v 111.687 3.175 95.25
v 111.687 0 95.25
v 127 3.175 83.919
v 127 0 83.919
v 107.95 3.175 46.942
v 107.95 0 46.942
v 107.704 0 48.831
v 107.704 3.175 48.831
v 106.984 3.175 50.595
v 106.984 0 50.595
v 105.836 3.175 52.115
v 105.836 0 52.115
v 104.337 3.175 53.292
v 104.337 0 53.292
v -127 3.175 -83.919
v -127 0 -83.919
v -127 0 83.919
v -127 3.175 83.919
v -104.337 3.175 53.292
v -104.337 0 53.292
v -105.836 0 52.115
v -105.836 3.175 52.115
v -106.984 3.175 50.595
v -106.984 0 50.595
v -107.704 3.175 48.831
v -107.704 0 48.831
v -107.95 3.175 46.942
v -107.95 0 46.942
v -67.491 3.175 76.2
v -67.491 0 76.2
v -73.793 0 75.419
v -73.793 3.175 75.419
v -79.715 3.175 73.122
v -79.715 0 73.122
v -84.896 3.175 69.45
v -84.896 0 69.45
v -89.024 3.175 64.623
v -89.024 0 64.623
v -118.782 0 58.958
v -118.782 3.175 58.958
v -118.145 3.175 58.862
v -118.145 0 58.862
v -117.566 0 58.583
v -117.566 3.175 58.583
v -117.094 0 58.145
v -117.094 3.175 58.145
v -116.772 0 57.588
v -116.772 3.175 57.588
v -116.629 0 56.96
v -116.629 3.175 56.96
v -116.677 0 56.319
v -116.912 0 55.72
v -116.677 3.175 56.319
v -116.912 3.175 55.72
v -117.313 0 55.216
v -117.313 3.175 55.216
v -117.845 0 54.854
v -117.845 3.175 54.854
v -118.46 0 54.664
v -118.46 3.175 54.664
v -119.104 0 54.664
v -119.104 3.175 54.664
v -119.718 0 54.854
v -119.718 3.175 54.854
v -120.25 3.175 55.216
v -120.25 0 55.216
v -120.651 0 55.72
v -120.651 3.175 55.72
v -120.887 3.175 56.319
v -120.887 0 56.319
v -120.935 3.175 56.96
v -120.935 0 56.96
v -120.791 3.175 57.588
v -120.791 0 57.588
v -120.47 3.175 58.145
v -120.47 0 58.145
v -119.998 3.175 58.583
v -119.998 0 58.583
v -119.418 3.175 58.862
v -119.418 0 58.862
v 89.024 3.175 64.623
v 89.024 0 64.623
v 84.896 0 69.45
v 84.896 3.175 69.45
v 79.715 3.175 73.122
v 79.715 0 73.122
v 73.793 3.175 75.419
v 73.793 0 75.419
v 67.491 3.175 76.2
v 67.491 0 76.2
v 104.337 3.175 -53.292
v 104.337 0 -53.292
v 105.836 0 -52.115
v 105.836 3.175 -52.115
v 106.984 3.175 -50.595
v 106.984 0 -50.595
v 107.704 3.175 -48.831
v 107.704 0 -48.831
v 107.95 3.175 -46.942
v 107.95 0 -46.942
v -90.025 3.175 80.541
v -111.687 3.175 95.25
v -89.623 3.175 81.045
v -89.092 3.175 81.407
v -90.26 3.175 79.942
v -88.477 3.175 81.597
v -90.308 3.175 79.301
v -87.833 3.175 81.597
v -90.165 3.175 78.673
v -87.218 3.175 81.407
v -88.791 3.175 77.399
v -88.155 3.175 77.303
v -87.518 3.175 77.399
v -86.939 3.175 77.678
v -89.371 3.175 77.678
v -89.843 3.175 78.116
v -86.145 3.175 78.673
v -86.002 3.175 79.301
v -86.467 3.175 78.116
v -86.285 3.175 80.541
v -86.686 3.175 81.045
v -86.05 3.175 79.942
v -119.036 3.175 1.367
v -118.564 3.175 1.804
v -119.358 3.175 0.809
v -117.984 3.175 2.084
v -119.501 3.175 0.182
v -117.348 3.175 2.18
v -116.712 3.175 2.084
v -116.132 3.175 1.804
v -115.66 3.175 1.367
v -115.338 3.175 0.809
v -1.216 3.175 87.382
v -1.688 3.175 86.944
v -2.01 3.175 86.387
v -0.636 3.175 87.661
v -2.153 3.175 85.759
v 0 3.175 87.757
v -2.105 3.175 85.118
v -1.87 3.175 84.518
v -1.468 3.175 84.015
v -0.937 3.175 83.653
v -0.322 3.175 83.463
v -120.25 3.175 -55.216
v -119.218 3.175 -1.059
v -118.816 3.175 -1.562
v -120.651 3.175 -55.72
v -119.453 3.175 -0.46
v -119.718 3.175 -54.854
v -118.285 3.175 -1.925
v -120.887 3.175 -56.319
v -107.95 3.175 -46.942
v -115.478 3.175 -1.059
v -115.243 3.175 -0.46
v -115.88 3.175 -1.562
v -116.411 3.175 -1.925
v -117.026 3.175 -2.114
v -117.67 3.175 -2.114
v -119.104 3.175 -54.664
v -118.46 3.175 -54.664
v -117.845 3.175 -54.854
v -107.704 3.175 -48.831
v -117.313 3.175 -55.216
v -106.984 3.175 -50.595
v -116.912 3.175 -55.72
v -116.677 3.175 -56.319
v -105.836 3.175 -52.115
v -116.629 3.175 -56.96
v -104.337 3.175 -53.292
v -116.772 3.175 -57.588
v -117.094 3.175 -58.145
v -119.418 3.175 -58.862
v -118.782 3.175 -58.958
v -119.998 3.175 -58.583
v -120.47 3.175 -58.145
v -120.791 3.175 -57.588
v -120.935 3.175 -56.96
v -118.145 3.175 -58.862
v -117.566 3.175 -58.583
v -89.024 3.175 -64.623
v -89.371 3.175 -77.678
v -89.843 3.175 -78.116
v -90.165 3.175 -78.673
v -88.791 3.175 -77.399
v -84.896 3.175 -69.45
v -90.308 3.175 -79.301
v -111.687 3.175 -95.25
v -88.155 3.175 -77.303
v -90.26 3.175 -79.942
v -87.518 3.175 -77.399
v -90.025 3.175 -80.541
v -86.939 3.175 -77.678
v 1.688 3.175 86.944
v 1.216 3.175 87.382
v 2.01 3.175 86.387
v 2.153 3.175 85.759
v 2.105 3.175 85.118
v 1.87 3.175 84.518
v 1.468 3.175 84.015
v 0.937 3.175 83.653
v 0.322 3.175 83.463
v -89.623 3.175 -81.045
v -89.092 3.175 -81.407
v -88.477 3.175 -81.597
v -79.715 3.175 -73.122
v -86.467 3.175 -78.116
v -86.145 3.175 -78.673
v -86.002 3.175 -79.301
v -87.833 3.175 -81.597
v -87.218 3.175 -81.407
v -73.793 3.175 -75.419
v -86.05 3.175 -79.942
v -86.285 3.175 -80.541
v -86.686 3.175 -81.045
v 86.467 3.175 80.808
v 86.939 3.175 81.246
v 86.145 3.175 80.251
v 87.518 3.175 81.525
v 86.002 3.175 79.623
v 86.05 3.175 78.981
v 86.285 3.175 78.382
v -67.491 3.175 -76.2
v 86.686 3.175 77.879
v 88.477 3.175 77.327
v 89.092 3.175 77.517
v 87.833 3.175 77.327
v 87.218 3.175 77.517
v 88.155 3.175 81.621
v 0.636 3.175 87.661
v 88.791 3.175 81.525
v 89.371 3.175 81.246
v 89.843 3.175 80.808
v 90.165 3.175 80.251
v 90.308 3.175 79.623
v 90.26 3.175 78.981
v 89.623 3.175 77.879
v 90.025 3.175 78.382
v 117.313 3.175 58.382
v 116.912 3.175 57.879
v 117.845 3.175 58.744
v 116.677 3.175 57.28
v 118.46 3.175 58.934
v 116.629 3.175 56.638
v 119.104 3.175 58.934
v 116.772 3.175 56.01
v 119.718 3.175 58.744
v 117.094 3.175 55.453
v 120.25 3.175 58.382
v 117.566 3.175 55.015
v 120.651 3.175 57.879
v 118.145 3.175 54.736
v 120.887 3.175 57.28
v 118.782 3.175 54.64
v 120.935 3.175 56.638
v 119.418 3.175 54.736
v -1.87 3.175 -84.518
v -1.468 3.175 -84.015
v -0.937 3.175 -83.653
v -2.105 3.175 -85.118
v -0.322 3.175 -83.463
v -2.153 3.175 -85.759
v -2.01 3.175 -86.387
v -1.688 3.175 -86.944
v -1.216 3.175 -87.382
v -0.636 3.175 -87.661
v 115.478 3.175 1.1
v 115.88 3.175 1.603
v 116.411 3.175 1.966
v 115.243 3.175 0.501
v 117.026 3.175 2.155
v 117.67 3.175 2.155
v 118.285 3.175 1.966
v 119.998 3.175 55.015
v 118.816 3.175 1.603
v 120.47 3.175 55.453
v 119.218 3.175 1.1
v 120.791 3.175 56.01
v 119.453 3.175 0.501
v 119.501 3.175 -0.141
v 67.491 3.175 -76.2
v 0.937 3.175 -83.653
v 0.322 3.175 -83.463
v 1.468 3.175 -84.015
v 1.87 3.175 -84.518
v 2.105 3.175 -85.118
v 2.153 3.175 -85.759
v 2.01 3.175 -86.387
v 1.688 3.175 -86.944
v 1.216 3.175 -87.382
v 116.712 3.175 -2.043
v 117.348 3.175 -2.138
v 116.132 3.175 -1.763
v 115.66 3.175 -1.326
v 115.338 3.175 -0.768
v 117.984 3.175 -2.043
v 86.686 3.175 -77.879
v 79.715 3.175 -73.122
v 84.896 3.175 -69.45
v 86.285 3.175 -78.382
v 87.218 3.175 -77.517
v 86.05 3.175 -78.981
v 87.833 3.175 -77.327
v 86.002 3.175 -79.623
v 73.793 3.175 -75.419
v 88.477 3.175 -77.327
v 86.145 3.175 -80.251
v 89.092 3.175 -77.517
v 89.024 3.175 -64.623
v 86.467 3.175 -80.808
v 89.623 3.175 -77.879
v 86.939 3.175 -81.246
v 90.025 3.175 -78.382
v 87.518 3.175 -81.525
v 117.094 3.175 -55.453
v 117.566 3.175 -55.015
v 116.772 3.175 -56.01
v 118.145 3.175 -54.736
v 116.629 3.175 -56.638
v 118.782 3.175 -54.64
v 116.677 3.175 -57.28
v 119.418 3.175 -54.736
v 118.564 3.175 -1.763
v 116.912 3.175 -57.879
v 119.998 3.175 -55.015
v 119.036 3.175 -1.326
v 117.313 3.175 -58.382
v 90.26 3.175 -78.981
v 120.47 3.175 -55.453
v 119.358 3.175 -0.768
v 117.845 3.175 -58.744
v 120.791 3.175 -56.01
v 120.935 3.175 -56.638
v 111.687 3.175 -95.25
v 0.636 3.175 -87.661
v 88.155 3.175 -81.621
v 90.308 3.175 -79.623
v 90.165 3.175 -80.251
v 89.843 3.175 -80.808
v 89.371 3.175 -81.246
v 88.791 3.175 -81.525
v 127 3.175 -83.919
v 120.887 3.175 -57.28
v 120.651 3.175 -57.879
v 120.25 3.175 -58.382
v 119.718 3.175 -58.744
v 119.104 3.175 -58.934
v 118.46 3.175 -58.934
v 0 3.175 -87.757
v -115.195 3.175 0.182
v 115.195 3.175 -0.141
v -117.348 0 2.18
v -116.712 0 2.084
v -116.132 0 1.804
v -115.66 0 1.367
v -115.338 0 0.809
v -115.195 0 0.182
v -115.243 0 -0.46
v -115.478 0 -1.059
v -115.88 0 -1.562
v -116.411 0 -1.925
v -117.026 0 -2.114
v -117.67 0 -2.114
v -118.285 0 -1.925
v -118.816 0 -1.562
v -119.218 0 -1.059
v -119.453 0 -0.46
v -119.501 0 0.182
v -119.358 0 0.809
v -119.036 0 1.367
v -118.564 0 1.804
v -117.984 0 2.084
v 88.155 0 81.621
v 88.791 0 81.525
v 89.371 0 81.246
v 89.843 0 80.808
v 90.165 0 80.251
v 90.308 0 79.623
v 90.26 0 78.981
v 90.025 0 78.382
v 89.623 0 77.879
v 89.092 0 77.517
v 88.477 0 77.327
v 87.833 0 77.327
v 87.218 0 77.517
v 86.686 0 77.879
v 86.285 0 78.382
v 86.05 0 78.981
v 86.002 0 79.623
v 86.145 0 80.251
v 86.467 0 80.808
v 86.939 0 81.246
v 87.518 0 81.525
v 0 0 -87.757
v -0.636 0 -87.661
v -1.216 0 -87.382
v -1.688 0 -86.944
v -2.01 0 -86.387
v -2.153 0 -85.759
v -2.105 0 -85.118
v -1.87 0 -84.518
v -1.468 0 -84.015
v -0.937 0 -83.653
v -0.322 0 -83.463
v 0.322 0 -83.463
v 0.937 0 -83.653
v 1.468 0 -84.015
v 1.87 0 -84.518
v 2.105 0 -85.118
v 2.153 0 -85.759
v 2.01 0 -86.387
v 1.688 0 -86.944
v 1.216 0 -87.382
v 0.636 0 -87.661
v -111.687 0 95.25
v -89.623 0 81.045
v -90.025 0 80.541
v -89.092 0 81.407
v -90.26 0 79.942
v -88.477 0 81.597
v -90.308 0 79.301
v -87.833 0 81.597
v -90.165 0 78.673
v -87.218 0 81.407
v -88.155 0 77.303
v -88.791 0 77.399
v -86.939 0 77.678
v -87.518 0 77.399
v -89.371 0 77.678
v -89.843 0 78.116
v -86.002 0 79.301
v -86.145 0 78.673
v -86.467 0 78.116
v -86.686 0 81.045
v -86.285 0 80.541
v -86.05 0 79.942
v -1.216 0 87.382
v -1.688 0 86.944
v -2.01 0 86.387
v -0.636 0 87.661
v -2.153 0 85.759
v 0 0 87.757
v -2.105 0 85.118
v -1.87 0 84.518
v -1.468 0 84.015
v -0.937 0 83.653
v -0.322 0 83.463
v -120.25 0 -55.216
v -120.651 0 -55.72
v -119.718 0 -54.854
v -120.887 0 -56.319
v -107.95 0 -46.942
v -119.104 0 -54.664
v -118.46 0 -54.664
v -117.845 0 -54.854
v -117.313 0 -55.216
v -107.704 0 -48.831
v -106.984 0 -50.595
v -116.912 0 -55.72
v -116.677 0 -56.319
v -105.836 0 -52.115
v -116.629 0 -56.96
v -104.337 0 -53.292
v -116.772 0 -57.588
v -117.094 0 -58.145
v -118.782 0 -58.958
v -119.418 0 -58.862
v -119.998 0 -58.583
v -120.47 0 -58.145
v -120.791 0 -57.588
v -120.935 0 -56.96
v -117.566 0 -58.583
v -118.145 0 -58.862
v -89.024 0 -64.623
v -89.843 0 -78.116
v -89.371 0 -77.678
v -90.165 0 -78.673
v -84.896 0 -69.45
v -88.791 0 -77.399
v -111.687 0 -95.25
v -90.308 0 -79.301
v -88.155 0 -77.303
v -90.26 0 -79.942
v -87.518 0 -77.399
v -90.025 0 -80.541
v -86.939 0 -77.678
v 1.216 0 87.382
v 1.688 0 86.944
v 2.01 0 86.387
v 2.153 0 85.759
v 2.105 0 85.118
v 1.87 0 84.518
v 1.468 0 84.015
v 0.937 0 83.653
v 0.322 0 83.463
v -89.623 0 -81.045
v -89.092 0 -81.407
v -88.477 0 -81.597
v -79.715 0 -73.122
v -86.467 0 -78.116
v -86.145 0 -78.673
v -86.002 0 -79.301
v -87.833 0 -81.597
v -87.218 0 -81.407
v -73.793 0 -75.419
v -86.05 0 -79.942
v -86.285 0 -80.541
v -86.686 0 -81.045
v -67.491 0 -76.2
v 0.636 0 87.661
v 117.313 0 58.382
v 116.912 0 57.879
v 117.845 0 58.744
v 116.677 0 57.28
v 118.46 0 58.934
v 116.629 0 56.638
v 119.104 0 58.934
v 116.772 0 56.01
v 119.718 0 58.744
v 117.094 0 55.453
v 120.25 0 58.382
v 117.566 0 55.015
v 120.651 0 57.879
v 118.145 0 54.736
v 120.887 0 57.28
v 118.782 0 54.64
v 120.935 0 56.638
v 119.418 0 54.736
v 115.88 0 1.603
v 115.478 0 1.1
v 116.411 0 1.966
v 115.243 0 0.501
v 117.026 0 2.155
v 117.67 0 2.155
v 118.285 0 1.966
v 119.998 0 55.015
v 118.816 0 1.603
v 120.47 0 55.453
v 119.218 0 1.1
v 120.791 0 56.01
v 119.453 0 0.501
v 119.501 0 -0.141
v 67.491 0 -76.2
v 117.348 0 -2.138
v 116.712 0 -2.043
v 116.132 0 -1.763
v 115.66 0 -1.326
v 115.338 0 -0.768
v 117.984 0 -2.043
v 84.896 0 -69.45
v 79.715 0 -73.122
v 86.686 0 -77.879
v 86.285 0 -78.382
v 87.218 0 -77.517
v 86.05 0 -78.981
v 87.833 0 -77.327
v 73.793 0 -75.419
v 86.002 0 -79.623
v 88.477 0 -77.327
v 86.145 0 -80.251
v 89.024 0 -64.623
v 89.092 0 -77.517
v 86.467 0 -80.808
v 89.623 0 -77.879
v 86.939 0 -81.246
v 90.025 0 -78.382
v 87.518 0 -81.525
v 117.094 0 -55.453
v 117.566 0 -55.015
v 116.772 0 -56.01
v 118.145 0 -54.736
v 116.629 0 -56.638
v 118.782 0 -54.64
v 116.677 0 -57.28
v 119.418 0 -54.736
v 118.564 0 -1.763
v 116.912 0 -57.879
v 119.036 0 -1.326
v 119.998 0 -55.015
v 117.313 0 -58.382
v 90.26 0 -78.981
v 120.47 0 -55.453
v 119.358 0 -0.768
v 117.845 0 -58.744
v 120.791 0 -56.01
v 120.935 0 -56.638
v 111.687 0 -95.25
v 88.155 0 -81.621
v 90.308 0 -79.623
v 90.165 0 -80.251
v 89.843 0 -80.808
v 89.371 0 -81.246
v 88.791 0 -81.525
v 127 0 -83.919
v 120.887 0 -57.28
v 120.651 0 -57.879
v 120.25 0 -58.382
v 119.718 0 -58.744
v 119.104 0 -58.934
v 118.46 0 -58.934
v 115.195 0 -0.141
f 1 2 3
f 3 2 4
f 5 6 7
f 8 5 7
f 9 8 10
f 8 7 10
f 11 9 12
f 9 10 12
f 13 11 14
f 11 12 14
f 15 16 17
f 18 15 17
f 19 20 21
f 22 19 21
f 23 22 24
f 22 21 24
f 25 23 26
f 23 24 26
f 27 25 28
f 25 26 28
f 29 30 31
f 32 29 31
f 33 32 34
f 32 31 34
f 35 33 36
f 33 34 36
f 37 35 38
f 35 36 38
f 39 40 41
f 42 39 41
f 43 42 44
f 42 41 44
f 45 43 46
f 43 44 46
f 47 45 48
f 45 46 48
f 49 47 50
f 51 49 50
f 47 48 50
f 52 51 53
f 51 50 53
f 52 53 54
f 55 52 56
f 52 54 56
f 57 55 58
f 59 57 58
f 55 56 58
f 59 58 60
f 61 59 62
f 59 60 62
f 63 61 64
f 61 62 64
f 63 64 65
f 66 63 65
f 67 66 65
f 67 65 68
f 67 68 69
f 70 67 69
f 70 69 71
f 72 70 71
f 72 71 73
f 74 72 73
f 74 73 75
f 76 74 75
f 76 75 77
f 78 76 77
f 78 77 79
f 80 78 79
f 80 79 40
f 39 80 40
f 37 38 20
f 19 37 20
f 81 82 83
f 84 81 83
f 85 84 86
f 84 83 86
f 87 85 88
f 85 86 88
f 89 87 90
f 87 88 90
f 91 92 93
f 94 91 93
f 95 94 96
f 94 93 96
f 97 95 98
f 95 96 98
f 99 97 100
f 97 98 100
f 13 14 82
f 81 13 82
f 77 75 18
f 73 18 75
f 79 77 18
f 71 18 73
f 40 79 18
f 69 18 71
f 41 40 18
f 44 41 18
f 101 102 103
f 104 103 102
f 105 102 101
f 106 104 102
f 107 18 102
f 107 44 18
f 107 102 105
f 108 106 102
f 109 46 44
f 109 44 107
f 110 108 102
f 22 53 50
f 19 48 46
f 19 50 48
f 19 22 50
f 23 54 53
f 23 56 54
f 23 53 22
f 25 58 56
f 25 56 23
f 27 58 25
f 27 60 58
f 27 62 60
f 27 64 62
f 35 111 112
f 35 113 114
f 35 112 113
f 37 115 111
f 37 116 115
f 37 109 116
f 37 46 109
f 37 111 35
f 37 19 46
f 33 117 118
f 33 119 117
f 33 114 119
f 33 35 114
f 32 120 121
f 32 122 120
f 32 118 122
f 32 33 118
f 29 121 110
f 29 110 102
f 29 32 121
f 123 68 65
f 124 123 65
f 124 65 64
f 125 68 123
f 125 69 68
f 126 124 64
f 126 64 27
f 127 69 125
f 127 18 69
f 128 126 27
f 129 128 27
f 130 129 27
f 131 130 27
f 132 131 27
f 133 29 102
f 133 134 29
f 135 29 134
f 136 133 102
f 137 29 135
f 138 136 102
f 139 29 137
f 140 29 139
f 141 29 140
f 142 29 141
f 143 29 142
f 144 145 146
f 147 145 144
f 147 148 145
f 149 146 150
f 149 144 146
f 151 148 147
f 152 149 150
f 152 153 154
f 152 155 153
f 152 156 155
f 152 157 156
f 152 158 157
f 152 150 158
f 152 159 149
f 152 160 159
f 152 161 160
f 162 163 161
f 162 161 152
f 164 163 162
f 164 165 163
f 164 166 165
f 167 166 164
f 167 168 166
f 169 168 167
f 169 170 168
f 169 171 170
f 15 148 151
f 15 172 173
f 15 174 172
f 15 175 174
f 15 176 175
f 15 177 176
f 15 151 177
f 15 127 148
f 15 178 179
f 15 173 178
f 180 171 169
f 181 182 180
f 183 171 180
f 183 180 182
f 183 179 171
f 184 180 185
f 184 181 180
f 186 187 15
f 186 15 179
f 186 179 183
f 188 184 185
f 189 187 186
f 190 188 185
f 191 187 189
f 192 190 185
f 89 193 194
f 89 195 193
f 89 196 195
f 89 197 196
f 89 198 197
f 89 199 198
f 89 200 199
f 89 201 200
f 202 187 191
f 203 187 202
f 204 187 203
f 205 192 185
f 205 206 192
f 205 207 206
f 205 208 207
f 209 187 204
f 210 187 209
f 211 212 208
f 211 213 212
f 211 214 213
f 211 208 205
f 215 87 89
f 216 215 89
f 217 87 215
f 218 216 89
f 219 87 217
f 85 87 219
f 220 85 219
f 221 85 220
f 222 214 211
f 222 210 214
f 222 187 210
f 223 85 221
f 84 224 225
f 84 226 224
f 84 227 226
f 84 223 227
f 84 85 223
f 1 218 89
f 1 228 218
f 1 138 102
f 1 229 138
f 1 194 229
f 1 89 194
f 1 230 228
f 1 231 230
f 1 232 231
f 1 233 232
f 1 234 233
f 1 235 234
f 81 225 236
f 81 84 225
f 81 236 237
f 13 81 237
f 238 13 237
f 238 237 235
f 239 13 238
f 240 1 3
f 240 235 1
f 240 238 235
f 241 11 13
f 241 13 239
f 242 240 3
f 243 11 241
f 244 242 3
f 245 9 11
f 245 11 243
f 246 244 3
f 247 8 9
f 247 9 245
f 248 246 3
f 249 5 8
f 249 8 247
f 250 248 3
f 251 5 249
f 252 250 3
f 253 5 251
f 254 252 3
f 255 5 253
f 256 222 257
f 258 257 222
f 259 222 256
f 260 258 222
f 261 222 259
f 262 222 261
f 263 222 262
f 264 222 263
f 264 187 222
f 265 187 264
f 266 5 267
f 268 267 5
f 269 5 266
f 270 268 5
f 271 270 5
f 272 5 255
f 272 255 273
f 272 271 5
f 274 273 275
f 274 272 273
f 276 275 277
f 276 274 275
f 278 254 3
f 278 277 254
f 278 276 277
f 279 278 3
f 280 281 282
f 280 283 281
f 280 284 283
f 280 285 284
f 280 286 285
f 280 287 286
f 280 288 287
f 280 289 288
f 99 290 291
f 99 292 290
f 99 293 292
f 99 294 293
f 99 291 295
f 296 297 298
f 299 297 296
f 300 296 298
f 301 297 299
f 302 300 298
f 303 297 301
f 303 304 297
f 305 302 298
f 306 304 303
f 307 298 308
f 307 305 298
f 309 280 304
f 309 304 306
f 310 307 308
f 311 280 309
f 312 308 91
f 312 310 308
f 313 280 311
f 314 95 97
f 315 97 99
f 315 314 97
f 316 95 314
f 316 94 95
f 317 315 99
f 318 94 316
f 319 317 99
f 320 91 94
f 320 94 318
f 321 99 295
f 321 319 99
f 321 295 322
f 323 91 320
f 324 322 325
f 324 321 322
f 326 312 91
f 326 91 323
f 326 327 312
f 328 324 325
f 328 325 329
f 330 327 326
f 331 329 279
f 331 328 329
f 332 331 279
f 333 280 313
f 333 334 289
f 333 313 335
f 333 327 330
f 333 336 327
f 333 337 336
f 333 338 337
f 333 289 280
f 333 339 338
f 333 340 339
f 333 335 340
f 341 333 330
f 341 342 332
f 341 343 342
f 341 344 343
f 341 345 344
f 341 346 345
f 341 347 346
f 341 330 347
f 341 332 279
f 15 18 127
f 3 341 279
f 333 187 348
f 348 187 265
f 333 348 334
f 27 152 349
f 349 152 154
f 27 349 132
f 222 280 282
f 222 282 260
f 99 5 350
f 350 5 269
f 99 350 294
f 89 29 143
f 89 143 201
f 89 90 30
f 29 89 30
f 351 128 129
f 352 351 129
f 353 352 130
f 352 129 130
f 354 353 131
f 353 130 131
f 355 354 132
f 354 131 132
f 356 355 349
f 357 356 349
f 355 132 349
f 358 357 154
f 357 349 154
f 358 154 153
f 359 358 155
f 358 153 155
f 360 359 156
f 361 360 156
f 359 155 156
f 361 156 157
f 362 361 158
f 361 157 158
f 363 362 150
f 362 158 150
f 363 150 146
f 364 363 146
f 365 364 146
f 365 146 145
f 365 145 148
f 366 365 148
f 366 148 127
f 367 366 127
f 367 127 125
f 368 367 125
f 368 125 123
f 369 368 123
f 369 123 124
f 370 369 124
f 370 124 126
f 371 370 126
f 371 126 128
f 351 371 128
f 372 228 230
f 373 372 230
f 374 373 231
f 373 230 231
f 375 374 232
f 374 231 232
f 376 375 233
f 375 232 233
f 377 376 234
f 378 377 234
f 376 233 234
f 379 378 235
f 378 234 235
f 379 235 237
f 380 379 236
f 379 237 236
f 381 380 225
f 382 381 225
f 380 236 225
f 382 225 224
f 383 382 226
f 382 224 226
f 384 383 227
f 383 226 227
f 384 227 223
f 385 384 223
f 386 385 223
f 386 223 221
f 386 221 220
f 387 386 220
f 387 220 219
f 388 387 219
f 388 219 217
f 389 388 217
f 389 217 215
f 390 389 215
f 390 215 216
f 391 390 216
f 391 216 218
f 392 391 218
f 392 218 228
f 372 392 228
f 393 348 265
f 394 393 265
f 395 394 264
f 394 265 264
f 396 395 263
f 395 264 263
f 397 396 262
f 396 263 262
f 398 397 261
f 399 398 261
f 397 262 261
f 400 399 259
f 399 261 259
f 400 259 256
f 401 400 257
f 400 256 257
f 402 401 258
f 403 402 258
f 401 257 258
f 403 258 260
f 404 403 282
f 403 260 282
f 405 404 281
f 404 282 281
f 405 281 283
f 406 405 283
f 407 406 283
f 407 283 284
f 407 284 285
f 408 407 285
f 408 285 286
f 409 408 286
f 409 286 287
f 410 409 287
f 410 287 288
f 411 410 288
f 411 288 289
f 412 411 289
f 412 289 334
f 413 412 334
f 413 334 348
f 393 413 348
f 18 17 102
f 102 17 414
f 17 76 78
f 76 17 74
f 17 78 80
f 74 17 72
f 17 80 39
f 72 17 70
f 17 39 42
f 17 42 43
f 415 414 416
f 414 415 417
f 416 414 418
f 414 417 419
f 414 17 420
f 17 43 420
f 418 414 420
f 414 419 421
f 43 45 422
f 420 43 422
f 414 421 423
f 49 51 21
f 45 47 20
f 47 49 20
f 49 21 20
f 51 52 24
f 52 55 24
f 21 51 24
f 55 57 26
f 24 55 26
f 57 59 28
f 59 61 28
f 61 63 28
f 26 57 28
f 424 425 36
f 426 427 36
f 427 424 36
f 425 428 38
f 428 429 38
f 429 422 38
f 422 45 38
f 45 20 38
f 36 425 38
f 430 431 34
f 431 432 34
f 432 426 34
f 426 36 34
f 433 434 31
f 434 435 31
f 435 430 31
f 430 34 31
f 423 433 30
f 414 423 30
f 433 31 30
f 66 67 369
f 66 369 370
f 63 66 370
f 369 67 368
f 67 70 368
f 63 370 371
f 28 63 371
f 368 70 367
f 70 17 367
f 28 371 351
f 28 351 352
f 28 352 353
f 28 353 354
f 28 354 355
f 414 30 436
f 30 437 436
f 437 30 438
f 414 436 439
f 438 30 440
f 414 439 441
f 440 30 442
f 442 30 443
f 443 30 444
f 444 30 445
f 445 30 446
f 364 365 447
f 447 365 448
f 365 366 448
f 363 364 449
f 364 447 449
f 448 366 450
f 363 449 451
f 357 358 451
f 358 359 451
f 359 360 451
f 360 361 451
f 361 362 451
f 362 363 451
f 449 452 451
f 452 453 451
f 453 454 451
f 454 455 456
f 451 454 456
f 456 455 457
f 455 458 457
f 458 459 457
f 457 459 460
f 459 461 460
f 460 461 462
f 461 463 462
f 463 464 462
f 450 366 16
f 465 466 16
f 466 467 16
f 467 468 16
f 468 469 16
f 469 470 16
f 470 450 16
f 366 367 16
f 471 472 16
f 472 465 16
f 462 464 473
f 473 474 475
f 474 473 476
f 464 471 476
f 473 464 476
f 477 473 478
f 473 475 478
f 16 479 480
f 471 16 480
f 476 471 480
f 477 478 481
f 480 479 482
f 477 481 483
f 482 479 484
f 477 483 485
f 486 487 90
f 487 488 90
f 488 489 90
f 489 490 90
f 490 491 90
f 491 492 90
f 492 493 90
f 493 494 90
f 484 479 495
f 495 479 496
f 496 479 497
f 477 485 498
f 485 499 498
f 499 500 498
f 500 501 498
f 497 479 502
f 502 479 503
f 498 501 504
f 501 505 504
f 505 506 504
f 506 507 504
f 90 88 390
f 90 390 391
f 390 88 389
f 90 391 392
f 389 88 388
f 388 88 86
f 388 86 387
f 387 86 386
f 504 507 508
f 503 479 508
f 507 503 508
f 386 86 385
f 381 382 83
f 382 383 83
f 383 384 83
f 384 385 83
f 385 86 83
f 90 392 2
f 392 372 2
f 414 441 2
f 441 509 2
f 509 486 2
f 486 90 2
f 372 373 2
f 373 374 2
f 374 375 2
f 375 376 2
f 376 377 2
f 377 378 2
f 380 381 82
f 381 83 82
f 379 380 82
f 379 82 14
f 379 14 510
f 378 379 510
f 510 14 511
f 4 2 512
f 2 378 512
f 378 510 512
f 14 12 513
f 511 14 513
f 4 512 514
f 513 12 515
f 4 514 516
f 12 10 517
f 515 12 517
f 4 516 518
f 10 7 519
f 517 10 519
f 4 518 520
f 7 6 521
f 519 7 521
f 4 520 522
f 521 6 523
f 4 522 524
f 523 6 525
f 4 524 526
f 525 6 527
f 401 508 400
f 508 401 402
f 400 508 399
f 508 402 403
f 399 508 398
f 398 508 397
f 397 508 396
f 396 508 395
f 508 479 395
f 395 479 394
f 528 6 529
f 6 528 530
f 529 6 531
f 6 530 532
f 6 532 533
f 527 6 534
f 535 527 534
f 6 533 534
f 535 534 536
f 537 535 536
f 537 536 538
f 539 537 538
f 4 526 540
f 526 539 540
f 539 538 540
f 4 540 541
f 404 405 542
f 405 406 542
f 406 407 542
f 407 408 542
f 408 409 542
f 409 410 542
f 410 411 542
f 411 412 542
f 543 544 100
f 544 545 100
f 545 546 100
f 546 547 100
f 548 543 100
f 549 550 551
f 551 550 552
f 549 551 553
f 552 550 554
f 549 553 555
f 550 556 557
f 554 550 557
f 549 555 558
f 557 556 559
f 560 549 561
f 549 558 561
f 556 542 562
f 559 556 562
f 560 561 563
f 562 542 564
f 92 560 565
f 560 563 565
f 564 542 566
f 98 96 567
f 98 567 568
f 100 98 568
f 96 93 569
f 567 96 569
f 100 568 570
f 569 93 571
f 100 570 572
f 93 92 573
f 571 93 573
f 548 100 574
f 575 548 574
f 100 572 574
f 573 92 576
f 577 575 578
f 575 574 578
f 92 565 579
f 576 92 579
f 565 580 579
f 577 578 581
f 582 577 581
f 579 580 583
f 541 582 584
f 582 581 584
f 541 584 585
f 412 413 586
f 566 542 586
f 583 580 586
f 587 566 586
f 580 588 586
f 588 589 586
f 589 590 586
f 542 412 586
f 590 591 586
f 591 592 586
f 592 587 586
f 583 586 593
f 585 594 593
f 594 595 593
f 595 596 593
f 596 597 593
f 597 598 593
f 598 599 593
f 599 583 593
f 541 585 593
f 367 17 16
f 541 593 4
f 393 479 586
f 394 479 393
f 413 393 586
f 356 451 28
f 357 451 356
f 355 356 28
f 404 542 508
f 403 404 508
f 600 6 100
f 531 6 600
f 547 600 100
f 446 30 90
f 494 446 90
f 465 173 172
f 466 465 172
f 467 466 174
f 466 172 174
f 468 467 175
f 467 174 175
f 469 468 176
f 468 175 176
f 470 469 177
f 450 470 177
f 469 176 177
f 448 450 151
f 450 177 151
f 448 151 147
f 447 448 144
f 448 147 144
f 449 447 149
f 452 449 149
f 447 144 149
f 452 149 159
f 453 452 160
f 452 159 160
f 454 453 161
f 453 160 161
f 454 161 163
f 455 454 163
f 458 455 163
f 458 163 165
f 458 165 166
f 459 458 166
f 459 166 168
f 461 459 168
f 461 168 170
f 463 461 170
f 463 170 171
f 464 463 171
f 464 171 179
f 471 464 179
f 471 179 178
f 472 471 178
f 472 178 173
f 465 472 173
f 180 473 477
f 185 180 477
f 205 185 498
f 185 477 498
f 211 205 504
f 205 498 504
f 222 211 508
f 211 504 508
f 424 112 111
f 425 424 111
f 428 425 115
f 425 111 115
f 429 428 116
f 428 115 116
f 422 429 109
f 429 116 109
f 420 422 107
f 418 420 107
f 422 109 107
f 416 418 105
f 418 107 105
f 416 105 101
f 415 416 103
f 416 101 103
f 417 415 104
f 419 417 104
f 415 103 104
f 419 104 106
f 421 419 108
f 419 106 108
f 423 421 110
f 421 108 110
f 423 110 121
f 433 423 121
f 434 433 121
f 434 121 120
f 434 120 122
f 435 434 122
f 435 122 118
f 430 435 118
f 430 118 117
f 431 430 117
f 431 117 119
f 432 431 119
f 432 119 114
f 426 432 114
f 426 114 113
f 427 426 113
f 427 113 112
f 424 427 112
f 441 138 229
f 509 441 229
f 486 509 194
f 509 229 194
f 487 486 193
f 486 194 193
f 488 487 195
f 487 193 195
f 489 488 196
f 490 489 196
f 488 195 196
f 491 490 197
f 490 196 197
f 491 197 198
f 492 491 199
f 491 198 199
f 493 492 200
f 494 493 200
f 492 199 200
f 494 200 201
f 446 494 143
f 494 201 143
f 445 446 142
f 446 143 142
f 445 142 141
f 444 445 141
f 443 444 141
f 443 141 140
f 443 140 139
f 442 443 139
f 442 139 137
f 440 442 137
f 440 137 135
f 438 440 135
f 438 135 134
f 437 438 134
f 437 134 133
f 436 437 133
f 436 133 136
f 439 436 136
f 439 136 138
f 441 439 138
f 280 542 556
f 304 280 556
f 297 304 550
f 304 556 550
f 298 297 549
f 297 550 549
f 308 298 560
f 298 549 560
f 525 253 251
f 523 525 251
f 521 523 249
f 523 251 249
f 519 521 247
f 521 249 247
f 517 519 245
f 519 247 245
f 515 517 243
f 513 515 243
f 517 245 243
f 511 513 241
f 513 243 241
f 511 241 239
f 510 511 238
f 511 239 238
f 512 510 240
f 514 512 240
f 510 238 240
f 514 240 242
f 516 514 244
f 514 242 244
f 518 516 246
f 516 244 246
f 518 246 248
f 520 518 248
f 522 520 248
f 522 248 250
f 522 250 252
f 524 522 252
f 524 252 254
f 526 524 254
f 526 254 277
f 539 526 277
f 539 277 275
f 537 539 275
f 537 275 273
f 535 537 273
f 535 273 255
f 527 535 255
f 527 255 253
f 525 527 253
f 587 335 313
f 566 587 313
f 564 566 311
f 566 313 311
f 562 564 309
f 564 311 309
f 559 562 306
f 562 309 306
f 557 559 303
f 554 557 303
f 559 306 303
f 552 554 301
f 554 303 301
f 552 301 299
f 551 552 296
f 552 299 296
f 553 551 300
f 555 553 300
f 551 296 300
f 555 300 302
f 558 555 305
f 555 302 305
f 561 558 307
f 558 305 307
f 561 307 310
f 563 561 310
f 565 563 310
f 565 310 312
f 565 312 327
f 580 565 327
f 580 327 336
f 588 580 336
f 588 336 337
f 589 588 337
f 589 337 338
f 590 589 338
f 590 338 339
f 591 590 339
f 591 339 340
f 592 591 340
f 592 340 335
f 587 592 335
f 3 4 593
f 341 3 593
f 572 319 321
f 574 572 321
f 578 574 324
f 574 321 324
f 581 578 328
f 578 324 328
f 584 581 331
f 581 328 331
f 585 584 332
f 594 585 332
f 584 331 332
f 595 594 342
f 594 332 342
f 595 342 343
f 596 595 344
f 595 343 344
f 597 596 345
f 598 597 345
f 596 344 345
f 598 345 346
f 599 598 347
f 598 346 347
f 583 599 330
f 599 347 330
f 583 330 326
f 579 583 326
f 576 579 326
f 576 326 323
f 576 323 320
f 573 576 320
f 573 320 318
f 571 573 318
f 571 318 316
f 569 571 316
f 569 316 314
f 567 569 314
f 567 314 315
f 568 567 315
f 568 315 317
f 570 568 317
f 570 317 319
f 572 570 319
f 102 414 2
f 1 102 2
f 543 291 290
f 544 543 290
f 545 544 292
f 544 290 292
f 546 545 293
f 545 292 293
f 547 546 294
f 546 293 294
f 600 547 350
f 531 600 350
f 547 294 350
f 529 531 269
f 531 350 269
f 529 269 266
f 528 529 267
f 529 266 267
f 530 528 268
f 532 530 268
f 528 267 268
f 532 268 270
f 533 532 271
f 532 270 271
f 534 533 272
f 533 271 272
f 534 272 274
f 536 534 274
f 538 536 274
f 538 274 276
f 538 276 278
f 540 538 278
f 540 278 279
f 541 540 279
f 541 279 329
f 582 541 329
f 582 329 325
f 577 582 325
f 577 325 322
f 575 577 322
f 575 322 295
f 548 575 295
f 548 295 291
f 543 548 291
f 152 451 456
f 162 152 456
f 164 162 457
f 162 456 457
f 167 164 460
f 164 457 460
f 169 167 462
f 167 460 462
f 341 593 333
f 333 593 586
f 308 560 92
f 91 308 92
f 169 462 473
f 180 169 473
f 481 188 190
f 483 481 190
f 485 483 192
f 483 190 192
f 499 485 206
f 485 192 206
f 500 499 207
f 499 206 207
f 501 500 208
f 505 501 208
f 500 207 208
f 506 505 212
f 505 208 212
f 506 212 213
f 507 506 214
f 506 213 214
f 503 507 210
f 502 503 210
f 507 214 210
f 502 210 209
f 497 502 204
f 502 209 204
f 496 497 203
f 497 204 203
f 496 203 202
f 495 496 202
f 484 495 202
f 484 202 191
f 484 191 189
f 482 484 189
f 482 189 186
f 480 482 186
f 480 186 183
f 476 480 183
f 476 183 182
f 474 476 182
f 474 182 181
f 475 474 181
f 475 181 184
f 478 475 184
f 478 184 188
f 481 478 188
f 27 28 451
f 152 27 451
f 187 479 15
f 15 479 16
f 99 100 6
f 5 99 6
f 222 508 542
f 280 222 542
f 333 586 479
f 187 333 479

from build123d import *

# Parameters (mm, degrees)
BOSS_EXTRUDE1_DEPTH = 3.175
SKETCH2_R           = 2.159
CUT_EXTRUDE1_DEPTH  = 159.781746826


with BuildPart() as part:
    # Sketch1 → Boss-Extrude1 (new body)
    with BuildSketch(Plane(origin=(0, 0, 0), x_dir=(1, 0, 0), z_dir=(0, 1, 0))):
        Polygon((-111.686526805, 95.25), (-127, 83.918625912), (-127, -83.918625912), (-111.686526805, -95.25), (111.686526805, -95.25), (127, -83.918625912), (127, 83.918625912), (111.686526805, 95.25), align=None)
        with BuildLine():
            Line((-107.95, -46.941679523), (-107.95, 46.941679523))
            ThreePointArc((-107.95, 46.941679523), (-106.983597986, 50.59457048), (-104.337251825, 53.291679523))
            Line((-104.337251825, 53.291679523), (-89.02377863, 64.62305361))
            ThreePointArc((-89.02377863, 64.62305361), (-79.714546423, 73.122295645), (-67.490526817, 76.2))
            Line((-67.490526817, 76.2), (67.490526817, 76.2))
            ThreePointArc((67.490526817, 76.2), (79.714546423, 73.122295645), (89.02377863, 64.62305361))
            Line((89.02377863, 64.62305361), (104.337251825, 53.291679523))
            ThreePointArc((104.337251825, 53.291679523), (106.983597986, 50.59457048), (107.95, 46.941679523))
            Line((107.95, 46.941679523), (107.95, -46.941679523))
            ThreePointArc((107.95, -46.941679523), (106.983597986, -50.59457048), (104.337251825, -53.291679523))
            Line((104.337251825, -53.291679523), (89.02377863, -64.62305361))
            ThreePointArc((89.02377863, -64.62305361), (79.714546423, -73.122295645), (67.490526817, -76.2))
            Line((67.490526817, -76.2), (-67.490526817, -76.2))
            ThreePointArc((-67.490526817, -76.2), (-79.714546423, -73.122295645), (-89.02377863, -64.62305361))
            Line((-89.02377863, -64.62305361), (-104.337251825, -53.291679523))
            ThreePointArc((-104.337251825, -53.291679523), (-106.983597986, -50.59457048), (-107.95, -46.941679523))
        make_face(mode=Mode.SUBTRACT)
    extrude(amount=BOSS_EXTRUDE1_DEPTH)

    # Sketch2 → Cut-Extrude1 (cut, through all)
    with BuildSketch(Plane(origin=(0, 3.175, 0), x_dir=(1, 0, 0), z_dir=(0, 1, 0))):
        with Locations(Location((-88.154790052, 79.46185563, 0), (0, 0, 270))):
            Circle(SKETCH2_R)
        with Locations(Location((88.154790052, 79.46185563, 0), (0, 0, 90))):
            Circle(SKETCH2_R)
        with Locations(Location((88.154790052, -79.46185563, 0), (0, 0, 270))):
            Circle(SKETCH2_R)
        with Locations(Location((-88.154790052, -79.46185563, 0), (0, 0, 90))):
            Circle(SKETCH2_R)
        with Locations(Location((-118.781736441, 56.799107455, 0), (0, 0, 90))):
            Circle(SKETCH2_R)
        with Locations(Location((118.781736441, 56.799107455, 0), (0, 0, 270))):
            Circle(SKETCH2_R)
        with Locations(Location((-118.781736441, -56.799107455, 0), (0, 0, 270))):
            Circle(SKETCH2_R)
        with Locations(Location((118.781736441, -56.799107455, 0), (0, 0, 90))):
            Circle(SKETCH2_R)
        with Locations(Location((0, -85.598, 0), (0, 0, 270))):
            Circle(SKETCH2_R)
        with Locations(Location((0, 85.598, 0), (0, 0, 90))):
            Circle(SKETCH2_R)
        with Locations(Location((-117.348, -0.020516524, 0), (0, 0, 270))):
            Circle(SKETCH2_R)
        with Locations(Location((117.348, -0.020516524, 0), (0, 0, 90))):
            Circle(SKETCH2_R)
    extrude(amount=-CUT_EXTRUDE1_DEPTH, mode=Mode.SUBTRACT)


solid = part.part
